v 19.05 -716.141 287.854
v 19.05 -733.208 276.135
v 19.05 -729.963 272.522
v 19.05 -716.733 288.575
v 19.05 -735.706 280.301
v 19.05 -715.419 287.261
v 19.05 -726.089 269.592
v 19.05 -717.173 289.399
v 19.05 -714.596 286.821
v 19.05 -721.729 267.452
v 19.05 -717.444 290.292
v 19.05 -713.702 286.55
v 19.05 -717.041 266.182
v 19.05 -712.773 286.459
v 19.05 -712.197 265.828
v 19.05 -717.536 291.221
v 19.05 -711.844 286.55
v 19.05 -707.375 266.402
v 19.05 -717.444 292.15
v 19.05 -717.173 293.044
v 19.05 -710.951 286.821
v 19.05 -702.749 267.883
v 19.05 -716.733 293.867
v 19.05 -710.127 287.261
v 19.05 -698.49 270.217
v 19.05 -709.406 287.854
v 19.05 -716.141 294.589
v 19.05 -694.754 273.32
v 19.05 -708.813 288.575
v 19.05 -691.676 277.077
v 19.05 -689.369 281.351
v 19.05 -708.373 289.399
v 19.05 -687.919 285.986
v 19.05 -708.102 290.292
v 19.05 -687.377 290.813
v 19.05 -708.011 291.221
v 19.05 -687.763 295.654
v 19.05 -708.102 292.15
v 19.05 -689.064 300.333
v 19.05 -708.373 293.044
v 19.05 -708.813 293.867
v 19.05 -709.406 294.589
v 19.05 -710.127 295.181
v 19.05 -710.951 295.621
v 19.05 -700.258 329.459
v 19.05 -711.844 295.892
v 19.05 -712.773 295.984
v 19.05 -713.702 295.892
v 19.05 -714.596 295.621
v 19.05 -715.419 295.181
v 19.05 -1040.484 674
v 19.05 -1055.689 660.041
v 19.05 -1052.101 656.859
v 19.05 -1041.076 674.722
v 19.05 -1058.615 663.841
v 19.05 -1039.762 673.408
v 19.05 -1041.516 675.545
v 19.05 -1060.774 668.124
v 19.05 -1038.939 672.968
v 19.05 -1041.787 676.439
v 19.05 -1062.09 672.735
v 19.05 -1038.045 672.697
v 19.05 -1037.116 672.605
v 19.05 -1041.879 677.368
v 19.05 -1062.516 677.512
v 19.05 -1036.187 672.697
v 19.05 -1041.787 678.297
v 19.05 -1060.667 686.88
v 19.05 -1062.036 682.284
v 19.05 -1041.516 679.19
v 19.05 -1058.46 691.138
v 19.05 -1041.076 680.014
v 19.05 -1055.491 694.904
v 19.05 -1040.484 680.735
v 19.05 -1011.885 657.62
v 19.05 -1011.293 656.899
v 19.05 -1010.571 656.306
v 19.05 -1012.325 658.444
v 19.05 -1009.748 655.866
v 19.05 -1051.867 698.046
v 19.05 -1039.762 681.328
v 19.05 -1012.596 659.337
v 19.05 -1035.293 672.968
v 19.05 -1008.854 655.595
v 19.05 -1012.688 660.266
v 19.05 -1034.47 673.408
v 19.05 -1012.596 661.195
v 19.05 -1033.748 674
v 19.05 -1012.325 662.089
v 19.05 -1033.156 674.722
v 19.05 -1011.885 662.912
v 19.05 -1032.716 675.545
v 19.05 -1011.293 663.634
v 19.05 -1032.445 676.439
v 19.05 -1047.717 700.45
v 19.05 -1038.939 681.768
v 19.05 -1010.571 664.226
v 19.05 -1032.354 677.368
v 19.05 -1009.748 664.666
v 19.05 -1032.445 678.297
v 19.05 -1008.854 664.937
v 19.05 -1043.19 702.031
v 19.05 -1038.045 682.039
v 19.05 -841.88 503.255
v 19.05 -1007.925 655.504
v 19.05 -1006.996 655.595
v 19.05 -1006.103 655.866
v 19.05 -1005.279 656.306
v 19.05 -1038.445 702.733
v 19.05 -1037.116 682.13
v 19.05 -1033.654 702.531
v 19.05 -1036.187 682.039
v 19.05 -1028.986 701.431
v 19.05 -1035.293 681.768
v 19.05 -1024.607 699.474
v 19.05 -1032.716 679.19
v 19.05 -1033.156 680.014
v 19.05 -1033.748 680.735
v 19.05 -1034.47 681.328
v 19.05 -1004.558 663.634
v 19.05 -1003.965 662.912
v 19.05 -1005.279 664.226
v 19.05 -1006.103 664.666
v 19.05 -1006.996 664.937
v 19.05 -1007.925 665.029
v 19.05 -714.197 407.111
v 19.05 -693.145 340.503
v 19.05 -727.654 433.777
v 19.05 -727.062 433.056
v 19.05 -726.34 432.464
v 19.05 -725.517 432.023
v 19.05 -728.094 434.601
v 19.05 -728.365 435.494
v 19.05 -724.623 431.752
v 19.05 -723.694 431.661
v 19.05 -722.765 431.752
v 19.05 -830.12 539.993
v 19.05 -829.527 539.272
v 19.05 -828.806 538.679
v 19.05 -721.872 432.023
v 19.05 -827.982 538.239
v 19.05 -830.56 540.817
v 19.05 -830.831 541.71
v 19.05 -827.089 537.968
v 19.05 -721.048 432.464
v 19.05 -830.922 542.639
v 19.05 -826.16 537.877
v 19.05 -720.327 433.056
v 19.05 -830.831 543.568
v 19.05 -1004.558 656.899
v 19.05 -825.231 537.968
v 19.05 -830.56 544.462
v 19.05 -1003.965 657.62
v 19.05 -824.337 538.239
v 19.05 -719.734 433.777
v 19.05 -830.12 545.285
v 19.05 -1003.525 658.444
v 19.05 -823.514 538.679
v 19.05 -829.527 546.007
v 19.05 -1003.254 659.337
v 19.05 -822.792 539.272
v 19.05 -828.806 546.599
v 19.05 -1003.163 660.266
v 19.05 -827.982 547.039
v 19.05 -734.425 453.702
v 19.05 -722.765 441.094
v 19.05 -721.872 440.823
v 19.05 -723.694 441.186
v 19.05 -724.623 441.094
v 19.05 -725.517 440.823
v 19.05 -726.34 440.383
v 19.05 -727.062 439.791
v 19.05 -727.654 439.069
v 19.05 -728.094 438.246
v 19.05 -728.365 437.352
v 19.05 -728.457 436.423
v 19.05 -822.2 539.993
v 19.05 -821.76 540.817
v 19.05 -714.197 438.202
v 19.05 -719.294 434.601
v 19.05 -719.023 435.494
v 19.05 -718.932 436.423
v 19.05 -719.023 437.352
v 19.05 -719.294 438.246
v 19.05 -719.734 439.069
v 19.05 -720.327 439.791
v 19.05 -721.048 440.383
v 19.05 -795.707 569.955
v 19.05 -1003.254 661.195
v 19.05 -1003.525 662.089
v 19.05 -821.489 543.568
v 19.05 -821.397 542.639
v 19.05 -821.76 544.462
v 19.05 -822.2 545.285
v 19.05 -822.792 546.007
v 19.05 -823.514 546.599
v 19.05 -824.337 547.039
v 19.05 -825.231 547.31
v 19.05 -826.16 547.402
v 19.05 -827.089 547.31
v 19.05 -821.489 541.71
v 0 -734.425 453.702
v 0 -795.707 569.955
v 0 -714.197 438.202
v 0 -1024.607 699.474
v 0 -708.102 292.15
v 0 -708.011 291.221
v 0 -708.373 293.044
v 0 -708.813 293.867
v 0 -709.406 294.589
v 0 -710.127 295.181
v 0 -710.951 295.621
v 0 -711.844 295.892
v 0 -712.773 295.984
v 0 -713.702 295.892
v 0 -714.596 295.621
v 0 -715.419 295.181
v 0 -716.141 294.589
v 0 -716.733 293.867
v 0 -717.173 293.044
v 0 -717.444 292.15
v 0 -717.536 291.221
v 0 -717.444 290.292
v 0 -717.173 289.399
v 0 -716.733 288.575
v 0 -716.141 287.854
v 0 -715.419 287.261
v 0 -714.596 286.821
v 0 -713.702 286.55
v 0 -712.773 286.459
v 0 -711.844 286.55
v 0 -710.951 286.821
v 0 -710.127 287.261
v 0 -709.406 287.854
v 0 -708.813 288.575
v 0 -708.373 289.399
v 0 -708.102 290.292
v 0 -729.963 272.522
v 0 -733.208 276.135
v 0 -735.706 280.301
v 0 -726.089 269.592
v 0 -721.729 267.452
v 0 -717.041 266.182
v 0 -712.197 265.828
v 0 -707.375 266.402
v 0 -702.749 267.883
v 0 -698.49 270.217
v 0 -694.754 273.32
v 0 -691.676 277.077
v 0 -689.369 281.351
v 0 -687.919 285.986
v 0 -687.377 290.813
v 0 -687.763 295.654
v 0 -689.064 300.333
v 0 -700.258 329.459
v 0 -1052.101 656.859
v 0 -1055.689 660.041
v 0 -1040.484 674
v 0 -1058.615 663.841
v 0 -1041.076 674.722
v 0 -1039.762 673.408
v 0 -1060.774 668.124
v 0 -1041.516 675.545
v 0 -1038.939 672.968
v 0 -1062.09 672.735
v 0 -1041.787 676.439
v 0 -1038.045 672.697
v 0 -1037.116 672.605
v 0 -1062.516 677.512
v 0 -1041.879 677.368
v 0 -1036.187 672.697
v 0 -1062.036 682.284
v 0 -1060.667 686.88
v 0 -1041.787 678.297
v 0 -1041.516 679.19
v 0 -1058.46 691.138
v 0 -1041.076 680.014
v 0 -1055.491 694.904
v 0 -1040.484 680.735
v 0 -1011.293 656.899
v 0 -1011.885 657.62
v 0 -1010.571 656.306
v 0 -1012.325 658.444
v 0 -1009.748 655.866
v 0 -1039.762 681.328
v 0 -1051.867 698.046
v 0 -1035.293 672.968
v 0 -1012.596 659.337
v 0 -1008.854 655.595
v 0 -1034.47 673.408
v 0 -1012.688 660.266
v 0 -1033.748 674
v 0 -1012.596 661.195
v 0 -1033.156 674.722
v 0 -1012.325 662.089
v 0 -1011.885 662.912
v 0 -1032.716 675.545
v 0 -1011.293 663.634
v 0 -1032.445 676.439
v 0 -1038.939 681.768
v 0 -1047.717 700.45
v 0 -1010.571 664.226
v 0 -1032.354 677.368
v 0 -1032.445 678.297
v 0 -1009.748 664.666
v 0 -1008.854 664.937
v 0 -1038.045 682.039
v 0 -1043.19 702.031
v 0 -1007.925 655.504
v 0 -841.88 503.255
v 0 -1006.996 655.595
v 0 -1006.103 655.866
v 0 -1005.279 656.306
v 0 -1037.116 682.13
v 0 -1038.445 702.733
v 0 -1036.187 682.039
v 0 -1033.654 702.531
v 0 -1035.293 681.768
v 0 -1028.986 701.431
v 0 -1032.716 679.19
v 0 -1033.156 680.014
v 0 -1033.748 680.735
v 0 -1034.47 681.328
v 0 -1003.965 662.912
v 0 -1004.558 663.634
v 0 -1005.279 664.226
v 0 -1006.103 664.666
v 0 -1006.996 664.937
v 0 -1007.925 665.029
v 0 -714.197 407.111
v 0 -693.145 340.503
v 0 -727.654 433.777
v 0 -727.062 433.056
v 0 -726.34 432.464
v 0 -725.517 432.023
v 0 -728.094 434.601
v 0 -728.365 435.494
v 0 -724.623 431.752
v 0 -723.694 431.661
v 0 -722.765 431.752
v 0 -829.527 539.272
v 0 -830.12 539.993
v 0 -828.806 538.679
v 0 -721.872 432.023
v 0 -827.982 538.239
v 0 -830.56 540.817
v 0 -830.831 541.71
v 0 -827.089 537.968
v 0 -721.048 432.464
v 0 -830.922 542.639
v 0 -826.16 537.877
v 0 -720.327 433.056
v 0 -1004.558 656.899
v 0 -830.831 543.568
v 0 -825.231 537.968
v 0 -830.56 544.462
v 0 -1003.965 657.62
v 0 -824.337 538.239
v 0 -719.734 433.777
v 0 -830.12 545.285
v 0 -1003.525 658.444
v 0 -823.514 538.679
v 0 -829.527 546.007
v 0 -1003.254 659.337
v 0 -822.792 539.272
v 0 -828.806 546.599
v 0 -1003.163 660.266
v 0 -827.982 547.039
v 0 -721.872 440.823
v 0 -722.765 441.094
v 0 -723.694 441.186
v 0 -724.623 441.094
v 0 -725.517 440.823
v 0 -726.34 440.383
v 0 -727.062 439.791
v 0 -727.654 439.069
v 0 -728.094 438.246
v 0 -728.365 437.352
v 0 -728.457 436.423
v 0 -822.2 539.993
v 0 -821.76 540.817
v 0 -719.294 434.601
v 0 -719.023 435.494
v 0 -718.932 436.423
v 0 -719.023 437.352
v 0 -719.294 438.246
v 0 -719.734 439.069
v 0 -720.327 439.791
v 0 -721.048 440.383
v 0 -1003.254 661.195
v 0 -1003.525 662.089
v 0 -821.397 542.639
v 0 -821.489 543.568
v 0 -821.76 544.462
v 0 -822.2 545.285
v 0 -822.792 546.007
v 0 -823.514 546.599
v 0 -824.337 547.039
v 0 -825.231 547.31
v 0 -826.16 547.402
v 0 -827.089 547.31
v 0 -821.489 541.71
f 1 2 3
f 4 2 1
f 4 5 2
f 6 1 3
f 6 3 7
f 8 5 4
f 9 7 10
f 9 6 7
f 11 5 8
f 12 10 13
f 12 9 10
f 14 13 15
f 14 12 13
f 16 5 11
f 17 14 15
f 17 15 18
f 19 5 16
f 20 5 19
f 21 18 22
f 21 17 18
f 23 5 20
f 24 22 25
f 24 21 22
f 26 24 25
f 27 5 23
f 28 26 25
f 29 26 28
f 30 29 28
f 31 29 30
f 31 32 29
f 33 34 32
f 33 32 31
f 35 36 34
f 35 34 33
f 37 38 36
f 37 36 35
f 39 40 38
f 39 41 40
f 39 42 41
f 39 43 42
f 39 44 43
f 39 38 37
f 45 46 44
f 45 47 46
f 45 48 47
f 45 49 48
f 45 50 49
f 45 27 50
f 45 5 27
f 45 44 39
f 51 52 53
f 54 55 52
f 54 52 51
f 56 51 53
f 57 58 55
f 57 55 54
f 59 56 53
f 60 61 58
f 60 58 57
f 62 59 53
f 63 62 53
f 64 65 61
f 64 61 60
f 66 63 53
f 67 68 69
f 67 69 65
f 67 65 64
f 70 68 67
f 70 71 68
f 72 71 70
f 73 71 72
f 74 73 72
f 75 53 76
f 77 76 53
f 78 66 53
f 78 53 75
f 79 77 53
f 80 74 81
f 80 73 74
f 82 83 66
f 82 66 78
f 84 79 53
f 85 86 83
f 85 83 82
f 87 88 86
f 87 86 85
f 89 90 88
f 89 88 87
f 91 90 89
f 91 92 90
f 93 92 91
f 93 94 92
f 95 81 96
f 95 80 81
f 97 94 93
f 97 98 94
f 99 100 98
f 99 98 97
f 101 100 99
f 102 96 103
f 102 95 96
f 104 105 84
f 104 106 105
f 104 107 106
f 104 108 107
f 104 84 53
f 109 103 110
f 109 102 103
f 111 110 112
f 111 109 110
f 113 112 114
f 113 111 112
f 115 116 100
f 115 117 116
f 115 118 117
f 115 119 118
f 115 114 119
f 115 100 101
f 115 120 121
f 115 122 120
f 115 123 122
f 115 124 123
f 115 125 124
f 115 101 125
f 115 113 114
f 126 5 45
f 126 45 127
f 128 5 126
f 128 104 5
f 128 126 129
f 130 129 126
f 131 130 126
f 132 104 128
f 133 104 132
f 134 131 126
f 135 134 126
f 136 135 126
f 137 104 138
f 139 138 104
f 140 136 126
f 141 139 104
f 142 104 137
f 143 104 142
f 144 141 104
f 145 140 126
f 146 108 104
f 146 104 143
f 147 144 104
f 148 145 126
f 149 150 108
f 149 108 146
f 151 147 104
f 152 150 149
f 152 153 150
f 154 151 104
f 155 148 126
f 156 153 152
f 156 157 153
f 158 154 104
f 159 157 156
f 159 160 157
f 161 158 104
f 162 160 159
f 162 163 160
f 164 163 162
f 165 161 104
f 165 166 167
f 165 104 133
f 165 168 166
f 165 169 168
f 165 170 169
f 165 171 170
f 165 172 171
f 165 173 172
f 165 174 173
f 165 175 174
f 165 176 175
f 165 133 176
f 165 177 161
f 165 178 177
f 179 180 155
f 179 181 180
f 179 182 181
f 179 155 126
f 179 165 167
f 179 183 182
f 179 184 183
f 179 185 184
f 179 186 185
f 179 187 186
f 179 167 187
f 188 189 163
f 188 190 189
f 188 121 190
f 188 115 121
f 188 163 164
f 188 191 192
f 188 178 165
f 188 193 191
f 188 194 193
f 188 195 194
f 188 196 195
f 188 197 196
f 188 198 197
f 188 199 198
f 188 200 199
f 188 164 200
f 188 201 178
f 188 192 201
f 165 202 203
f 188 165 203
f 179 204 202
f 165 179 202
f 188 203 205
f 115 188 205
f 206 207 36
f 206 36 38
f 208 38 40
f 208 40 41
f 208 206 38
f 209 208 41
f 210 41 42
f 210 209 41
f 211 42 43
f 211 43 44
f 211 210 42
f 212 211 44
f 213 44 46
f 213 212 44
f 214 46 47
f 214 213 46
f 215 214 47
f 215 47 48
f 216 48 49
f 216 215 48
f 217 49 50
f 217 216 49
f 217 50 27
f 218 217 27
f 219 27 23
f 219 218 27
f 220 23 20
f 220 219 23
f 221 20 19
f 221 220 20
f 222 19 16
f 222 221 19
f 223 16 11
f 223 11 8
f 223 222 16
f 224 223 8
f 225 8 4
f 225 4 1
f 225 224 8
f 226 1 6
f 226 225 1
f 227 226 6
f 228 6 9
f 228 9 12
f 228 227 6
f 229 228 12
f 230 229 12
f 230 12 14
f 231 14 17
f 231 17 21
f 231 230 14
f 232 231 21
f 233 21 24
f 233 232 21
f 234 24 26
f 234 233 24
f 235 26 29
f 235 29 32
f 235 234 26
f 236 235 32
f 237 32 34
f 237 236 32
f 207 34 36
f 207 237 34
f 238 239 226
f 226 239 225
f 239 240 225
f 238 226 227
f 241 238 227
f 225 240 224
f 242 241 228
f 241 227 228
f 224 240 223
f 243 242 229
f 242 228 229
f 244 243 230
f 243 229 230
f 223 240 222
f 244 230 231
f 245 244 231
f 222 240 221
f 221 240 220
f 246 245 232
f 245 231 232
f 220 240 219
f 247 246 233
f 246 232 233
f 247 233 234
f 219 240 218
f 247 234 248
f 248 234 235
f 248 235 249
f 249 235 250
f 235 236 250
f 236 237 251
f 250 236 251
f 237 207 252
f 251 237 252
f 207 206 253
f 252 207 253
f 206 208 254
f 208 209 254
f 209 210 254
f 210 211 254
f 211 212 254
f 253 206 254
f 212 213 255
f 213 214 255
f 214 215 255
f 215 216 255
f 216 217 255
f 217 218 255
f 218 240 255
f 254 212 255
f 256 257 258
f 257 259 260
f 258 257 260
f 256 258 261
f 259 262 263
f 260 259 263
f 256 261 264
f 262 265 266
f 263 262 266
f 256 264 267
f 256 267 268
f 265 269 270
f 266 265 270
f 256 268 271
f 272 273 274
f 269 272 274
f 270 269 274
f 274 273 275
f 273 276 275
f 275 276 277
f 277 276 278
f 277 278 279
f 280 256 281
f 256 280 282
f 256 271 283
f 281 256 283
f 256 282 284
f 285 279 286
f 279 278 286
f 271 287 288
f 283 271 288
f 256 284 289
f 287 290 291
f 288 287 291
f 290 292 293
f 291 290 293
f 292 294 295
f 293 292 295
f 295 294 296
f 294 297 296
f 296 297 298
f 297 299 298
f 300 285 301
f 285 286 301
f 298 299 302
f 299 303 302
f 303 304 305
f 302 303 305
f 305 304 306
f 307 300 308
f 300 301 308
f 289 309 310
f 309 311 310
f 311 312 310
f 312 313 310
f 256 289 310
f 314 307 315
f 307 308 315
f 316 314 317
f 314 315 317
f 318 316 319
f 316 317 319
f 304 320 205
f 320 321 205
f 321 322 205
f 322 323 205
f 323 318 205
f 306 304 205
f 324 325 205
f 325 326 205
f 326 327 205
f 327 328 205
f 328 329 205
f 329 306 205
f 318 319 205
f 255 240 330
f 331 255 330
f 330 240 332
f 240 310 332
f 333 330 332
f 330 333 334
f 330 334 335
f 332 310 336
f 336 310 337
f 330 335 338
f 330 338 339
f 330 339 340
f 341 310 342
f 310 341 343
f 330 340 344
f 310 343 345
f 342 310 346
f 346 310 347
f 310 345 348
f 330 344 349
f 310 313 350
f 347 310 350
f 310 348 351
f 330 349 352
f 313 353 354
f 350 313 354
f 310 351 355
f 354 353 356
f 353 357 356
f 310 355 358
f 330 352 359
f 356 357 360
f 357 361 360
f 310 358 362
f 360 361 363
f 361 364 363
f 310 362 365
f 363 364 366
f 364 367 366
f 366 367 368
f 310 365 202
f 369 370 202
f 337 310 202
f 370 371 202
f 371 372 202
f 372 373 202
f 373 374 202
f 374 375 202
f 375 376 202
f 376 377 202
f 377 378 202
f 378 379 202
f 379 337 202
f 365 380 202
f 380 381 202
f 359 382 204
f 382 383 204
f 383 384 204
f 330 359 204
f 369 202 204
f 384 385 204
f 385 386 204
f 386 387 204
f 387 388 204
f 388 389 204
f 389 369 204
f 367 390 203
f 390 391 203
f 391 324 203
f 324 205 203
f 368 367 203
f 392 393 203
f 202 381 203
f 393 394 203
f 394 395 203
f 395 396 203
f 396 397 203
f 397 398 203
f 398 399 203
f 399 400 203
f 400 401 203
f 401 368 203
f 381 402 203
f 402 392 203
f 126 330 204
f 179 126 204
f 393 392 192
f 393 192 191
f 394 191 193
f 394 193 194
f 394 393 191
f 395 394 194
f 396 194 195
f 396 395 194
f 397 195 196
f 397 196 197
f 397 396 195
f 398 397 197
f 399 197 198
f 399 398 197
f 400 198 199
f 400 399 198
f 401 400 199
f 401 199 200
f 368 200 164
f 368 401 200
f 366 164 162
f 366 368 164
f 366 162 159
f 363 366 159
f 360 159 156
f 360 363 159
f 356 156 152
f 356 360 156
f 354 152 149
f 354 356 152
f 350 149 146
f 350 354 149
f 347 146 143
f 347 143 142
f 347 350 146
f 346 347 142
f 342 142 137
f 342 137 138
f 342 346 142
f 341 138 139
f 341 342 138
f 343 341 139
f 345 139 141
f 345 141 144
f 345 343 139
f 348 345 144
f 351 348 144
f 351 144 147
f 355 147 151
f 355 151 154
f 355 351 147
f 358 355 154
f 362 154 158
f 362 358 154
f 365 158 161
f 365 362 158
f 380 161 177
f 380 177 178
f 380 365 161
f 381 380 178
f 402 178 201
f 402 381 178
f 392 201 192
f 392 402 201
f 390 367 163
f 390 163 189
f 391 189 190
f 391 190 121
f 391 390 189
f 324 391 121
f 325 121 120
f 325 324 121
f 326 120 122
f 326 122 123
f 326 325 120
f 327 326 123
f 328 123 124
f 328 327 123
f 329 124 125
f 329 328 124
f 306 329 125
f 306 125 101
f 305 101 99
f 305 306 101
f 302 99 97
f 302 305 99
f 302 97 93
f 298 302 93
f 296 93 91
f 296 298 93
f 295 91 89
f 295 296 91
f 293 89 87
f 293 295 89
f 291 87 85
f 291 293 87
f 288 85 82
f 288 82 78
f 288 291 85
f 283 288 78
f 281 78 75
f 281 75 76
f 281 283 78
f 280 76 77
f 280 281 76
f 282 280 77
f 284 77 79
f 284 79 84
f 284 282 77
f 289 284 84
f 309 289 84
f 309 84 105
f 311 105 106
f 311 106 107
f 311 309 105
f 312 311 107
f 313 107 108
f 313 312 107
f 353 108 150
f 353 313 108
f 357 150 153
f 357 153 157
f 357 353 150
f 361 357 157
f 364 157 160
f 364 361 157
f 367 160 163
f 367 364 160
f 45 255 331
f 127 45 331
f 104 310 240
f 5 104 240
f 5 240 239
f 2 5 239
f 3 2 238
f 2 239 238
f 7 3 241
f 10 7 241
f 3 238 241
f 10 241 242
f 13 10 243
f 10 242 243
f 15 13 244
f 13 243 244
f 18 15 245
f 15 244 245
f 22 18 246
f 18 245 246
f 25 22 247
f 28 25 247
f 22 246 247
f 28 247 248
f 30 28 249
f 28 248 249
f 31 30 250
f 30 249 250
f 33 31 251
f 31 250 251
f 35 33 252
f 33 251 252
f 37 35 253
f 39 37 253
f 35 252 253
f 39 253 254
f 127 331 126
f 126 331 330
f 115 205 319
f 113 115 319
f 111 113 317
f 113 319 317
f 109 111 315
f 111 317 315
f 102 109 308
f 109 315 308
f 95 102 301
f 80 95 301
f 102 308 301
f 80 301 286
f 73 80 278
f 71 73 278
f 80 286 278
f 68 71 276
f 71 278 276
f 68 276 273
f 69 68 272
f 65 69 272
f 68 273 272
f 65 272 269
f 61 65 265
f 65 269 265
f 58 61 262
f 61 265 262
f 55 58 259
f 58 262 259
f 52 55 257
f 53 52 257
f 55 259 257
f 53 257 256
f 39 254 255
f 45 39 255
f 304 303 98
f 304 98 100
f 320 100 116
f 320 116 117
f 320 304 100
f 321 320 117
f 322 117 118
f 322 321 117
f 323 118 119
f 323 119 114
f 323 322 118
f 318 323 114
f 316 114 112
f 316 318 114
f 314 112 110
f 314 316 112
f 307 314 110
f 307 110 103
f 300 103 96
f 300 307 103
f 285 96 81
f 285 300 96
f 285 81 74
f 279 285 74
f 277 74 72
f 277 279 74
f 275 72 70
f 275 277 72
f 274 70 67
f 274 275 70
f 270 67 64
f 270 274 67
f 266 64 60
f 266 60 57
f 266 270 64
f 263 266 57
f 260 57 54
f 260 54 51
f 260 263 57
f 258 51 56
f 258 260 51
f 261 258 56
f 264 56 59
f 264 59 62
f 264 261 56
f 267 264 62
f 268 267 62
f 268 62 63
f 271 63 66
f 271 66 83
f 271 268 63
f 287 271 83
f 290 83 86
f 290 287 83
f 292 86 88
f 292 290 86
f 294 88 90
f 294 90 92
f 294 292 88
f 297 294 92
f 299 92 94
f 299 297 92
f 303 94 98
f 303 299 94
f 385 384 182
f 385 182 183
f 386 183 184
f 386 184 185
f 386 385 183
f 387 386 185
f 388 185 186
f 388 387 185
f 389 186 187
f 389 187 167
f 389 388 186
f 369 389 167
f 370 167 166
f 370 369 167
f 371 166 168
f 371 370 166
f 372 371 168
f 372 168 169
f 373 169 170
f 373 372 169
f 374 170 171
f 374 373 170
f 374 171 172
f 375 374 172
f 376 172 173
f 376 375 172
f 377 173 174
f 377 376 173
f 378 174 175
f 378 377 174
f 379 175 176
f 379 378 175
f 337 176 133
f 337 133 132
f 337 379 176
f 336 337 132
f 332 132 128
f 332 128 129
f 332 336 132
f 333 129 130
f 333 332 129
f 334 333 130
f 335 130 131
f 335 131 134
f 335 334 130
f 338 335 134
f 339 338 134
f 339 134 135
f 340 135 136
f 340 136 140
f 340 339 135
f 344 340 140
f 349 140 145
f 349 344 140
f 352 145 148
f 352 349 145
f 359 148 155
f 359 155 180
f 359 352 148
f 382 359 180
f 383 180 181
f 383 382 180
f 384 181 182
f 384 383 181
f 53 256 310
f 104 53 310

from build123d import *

# Parameters (mm, degrees)
F2_R     = 4.7625
F3_DEPTH = 19.05


with BuildPart() as f3:
    # F2 (on Right) → F3 (new body)
    with BuildSketch(Plane.YZ):
        with BuildLine():
            ThreePointArc((-1024.607466, 699.474183), (-1058.459537, 691.137771), (-1052.101189, 656.859061))
            Line((-1052.101189, 656.859061), (-841.879547, 503.255308))
            Line((-841.879547, 503.255308), (-735.705726, 280.30051))
            ThreePointArc((-735.705726, 280.30051), (-702.74925, 267.882869), (-689.064049, 300.333483))
            Line((-689.064049, 300.333483), (-700.258076, 329.45928))
            Line((-700.258076, 329.45928), (-693.145152, 340.503097))
            Line((-693.145152, 340.503097), (-714.197453, 407.111138))
            Line((-714.197453, 407.111138), (-714.197453, 438.202467))
            Line((-714.197453, 438.202467), (-734.424889, 453.702241))
            Line((-734.424889, 453.702241), (-795.707226, 569.954991))
            Line((-795.707226, 569.954991), (-1024.607466, 699.474183))
        make_face()
        with Locations((-712.773263, 291.221231)):
            Circle(F2_R, mode=Mode.SUBTRACT)
        with Locations((-723.694212, 436.423379)):
            Circle(F2_R, mode=Mode.SUBTRACT)
        with Locations((-1037.116024, 677.367714)):
            Circle(F2_R, mode=Mode.SUBTRACT)
        with Locations((-1007.925361, 660.266367)):
            Circle(F2_R, mode=Mode.SUBTRACT)
        with Locations((-826.159707, 542.639145)):
            Circle(F2_R, mode=Mode.SUBTRACT)
    extrude(amount=F3_DEPTH)


solid = f3.part
